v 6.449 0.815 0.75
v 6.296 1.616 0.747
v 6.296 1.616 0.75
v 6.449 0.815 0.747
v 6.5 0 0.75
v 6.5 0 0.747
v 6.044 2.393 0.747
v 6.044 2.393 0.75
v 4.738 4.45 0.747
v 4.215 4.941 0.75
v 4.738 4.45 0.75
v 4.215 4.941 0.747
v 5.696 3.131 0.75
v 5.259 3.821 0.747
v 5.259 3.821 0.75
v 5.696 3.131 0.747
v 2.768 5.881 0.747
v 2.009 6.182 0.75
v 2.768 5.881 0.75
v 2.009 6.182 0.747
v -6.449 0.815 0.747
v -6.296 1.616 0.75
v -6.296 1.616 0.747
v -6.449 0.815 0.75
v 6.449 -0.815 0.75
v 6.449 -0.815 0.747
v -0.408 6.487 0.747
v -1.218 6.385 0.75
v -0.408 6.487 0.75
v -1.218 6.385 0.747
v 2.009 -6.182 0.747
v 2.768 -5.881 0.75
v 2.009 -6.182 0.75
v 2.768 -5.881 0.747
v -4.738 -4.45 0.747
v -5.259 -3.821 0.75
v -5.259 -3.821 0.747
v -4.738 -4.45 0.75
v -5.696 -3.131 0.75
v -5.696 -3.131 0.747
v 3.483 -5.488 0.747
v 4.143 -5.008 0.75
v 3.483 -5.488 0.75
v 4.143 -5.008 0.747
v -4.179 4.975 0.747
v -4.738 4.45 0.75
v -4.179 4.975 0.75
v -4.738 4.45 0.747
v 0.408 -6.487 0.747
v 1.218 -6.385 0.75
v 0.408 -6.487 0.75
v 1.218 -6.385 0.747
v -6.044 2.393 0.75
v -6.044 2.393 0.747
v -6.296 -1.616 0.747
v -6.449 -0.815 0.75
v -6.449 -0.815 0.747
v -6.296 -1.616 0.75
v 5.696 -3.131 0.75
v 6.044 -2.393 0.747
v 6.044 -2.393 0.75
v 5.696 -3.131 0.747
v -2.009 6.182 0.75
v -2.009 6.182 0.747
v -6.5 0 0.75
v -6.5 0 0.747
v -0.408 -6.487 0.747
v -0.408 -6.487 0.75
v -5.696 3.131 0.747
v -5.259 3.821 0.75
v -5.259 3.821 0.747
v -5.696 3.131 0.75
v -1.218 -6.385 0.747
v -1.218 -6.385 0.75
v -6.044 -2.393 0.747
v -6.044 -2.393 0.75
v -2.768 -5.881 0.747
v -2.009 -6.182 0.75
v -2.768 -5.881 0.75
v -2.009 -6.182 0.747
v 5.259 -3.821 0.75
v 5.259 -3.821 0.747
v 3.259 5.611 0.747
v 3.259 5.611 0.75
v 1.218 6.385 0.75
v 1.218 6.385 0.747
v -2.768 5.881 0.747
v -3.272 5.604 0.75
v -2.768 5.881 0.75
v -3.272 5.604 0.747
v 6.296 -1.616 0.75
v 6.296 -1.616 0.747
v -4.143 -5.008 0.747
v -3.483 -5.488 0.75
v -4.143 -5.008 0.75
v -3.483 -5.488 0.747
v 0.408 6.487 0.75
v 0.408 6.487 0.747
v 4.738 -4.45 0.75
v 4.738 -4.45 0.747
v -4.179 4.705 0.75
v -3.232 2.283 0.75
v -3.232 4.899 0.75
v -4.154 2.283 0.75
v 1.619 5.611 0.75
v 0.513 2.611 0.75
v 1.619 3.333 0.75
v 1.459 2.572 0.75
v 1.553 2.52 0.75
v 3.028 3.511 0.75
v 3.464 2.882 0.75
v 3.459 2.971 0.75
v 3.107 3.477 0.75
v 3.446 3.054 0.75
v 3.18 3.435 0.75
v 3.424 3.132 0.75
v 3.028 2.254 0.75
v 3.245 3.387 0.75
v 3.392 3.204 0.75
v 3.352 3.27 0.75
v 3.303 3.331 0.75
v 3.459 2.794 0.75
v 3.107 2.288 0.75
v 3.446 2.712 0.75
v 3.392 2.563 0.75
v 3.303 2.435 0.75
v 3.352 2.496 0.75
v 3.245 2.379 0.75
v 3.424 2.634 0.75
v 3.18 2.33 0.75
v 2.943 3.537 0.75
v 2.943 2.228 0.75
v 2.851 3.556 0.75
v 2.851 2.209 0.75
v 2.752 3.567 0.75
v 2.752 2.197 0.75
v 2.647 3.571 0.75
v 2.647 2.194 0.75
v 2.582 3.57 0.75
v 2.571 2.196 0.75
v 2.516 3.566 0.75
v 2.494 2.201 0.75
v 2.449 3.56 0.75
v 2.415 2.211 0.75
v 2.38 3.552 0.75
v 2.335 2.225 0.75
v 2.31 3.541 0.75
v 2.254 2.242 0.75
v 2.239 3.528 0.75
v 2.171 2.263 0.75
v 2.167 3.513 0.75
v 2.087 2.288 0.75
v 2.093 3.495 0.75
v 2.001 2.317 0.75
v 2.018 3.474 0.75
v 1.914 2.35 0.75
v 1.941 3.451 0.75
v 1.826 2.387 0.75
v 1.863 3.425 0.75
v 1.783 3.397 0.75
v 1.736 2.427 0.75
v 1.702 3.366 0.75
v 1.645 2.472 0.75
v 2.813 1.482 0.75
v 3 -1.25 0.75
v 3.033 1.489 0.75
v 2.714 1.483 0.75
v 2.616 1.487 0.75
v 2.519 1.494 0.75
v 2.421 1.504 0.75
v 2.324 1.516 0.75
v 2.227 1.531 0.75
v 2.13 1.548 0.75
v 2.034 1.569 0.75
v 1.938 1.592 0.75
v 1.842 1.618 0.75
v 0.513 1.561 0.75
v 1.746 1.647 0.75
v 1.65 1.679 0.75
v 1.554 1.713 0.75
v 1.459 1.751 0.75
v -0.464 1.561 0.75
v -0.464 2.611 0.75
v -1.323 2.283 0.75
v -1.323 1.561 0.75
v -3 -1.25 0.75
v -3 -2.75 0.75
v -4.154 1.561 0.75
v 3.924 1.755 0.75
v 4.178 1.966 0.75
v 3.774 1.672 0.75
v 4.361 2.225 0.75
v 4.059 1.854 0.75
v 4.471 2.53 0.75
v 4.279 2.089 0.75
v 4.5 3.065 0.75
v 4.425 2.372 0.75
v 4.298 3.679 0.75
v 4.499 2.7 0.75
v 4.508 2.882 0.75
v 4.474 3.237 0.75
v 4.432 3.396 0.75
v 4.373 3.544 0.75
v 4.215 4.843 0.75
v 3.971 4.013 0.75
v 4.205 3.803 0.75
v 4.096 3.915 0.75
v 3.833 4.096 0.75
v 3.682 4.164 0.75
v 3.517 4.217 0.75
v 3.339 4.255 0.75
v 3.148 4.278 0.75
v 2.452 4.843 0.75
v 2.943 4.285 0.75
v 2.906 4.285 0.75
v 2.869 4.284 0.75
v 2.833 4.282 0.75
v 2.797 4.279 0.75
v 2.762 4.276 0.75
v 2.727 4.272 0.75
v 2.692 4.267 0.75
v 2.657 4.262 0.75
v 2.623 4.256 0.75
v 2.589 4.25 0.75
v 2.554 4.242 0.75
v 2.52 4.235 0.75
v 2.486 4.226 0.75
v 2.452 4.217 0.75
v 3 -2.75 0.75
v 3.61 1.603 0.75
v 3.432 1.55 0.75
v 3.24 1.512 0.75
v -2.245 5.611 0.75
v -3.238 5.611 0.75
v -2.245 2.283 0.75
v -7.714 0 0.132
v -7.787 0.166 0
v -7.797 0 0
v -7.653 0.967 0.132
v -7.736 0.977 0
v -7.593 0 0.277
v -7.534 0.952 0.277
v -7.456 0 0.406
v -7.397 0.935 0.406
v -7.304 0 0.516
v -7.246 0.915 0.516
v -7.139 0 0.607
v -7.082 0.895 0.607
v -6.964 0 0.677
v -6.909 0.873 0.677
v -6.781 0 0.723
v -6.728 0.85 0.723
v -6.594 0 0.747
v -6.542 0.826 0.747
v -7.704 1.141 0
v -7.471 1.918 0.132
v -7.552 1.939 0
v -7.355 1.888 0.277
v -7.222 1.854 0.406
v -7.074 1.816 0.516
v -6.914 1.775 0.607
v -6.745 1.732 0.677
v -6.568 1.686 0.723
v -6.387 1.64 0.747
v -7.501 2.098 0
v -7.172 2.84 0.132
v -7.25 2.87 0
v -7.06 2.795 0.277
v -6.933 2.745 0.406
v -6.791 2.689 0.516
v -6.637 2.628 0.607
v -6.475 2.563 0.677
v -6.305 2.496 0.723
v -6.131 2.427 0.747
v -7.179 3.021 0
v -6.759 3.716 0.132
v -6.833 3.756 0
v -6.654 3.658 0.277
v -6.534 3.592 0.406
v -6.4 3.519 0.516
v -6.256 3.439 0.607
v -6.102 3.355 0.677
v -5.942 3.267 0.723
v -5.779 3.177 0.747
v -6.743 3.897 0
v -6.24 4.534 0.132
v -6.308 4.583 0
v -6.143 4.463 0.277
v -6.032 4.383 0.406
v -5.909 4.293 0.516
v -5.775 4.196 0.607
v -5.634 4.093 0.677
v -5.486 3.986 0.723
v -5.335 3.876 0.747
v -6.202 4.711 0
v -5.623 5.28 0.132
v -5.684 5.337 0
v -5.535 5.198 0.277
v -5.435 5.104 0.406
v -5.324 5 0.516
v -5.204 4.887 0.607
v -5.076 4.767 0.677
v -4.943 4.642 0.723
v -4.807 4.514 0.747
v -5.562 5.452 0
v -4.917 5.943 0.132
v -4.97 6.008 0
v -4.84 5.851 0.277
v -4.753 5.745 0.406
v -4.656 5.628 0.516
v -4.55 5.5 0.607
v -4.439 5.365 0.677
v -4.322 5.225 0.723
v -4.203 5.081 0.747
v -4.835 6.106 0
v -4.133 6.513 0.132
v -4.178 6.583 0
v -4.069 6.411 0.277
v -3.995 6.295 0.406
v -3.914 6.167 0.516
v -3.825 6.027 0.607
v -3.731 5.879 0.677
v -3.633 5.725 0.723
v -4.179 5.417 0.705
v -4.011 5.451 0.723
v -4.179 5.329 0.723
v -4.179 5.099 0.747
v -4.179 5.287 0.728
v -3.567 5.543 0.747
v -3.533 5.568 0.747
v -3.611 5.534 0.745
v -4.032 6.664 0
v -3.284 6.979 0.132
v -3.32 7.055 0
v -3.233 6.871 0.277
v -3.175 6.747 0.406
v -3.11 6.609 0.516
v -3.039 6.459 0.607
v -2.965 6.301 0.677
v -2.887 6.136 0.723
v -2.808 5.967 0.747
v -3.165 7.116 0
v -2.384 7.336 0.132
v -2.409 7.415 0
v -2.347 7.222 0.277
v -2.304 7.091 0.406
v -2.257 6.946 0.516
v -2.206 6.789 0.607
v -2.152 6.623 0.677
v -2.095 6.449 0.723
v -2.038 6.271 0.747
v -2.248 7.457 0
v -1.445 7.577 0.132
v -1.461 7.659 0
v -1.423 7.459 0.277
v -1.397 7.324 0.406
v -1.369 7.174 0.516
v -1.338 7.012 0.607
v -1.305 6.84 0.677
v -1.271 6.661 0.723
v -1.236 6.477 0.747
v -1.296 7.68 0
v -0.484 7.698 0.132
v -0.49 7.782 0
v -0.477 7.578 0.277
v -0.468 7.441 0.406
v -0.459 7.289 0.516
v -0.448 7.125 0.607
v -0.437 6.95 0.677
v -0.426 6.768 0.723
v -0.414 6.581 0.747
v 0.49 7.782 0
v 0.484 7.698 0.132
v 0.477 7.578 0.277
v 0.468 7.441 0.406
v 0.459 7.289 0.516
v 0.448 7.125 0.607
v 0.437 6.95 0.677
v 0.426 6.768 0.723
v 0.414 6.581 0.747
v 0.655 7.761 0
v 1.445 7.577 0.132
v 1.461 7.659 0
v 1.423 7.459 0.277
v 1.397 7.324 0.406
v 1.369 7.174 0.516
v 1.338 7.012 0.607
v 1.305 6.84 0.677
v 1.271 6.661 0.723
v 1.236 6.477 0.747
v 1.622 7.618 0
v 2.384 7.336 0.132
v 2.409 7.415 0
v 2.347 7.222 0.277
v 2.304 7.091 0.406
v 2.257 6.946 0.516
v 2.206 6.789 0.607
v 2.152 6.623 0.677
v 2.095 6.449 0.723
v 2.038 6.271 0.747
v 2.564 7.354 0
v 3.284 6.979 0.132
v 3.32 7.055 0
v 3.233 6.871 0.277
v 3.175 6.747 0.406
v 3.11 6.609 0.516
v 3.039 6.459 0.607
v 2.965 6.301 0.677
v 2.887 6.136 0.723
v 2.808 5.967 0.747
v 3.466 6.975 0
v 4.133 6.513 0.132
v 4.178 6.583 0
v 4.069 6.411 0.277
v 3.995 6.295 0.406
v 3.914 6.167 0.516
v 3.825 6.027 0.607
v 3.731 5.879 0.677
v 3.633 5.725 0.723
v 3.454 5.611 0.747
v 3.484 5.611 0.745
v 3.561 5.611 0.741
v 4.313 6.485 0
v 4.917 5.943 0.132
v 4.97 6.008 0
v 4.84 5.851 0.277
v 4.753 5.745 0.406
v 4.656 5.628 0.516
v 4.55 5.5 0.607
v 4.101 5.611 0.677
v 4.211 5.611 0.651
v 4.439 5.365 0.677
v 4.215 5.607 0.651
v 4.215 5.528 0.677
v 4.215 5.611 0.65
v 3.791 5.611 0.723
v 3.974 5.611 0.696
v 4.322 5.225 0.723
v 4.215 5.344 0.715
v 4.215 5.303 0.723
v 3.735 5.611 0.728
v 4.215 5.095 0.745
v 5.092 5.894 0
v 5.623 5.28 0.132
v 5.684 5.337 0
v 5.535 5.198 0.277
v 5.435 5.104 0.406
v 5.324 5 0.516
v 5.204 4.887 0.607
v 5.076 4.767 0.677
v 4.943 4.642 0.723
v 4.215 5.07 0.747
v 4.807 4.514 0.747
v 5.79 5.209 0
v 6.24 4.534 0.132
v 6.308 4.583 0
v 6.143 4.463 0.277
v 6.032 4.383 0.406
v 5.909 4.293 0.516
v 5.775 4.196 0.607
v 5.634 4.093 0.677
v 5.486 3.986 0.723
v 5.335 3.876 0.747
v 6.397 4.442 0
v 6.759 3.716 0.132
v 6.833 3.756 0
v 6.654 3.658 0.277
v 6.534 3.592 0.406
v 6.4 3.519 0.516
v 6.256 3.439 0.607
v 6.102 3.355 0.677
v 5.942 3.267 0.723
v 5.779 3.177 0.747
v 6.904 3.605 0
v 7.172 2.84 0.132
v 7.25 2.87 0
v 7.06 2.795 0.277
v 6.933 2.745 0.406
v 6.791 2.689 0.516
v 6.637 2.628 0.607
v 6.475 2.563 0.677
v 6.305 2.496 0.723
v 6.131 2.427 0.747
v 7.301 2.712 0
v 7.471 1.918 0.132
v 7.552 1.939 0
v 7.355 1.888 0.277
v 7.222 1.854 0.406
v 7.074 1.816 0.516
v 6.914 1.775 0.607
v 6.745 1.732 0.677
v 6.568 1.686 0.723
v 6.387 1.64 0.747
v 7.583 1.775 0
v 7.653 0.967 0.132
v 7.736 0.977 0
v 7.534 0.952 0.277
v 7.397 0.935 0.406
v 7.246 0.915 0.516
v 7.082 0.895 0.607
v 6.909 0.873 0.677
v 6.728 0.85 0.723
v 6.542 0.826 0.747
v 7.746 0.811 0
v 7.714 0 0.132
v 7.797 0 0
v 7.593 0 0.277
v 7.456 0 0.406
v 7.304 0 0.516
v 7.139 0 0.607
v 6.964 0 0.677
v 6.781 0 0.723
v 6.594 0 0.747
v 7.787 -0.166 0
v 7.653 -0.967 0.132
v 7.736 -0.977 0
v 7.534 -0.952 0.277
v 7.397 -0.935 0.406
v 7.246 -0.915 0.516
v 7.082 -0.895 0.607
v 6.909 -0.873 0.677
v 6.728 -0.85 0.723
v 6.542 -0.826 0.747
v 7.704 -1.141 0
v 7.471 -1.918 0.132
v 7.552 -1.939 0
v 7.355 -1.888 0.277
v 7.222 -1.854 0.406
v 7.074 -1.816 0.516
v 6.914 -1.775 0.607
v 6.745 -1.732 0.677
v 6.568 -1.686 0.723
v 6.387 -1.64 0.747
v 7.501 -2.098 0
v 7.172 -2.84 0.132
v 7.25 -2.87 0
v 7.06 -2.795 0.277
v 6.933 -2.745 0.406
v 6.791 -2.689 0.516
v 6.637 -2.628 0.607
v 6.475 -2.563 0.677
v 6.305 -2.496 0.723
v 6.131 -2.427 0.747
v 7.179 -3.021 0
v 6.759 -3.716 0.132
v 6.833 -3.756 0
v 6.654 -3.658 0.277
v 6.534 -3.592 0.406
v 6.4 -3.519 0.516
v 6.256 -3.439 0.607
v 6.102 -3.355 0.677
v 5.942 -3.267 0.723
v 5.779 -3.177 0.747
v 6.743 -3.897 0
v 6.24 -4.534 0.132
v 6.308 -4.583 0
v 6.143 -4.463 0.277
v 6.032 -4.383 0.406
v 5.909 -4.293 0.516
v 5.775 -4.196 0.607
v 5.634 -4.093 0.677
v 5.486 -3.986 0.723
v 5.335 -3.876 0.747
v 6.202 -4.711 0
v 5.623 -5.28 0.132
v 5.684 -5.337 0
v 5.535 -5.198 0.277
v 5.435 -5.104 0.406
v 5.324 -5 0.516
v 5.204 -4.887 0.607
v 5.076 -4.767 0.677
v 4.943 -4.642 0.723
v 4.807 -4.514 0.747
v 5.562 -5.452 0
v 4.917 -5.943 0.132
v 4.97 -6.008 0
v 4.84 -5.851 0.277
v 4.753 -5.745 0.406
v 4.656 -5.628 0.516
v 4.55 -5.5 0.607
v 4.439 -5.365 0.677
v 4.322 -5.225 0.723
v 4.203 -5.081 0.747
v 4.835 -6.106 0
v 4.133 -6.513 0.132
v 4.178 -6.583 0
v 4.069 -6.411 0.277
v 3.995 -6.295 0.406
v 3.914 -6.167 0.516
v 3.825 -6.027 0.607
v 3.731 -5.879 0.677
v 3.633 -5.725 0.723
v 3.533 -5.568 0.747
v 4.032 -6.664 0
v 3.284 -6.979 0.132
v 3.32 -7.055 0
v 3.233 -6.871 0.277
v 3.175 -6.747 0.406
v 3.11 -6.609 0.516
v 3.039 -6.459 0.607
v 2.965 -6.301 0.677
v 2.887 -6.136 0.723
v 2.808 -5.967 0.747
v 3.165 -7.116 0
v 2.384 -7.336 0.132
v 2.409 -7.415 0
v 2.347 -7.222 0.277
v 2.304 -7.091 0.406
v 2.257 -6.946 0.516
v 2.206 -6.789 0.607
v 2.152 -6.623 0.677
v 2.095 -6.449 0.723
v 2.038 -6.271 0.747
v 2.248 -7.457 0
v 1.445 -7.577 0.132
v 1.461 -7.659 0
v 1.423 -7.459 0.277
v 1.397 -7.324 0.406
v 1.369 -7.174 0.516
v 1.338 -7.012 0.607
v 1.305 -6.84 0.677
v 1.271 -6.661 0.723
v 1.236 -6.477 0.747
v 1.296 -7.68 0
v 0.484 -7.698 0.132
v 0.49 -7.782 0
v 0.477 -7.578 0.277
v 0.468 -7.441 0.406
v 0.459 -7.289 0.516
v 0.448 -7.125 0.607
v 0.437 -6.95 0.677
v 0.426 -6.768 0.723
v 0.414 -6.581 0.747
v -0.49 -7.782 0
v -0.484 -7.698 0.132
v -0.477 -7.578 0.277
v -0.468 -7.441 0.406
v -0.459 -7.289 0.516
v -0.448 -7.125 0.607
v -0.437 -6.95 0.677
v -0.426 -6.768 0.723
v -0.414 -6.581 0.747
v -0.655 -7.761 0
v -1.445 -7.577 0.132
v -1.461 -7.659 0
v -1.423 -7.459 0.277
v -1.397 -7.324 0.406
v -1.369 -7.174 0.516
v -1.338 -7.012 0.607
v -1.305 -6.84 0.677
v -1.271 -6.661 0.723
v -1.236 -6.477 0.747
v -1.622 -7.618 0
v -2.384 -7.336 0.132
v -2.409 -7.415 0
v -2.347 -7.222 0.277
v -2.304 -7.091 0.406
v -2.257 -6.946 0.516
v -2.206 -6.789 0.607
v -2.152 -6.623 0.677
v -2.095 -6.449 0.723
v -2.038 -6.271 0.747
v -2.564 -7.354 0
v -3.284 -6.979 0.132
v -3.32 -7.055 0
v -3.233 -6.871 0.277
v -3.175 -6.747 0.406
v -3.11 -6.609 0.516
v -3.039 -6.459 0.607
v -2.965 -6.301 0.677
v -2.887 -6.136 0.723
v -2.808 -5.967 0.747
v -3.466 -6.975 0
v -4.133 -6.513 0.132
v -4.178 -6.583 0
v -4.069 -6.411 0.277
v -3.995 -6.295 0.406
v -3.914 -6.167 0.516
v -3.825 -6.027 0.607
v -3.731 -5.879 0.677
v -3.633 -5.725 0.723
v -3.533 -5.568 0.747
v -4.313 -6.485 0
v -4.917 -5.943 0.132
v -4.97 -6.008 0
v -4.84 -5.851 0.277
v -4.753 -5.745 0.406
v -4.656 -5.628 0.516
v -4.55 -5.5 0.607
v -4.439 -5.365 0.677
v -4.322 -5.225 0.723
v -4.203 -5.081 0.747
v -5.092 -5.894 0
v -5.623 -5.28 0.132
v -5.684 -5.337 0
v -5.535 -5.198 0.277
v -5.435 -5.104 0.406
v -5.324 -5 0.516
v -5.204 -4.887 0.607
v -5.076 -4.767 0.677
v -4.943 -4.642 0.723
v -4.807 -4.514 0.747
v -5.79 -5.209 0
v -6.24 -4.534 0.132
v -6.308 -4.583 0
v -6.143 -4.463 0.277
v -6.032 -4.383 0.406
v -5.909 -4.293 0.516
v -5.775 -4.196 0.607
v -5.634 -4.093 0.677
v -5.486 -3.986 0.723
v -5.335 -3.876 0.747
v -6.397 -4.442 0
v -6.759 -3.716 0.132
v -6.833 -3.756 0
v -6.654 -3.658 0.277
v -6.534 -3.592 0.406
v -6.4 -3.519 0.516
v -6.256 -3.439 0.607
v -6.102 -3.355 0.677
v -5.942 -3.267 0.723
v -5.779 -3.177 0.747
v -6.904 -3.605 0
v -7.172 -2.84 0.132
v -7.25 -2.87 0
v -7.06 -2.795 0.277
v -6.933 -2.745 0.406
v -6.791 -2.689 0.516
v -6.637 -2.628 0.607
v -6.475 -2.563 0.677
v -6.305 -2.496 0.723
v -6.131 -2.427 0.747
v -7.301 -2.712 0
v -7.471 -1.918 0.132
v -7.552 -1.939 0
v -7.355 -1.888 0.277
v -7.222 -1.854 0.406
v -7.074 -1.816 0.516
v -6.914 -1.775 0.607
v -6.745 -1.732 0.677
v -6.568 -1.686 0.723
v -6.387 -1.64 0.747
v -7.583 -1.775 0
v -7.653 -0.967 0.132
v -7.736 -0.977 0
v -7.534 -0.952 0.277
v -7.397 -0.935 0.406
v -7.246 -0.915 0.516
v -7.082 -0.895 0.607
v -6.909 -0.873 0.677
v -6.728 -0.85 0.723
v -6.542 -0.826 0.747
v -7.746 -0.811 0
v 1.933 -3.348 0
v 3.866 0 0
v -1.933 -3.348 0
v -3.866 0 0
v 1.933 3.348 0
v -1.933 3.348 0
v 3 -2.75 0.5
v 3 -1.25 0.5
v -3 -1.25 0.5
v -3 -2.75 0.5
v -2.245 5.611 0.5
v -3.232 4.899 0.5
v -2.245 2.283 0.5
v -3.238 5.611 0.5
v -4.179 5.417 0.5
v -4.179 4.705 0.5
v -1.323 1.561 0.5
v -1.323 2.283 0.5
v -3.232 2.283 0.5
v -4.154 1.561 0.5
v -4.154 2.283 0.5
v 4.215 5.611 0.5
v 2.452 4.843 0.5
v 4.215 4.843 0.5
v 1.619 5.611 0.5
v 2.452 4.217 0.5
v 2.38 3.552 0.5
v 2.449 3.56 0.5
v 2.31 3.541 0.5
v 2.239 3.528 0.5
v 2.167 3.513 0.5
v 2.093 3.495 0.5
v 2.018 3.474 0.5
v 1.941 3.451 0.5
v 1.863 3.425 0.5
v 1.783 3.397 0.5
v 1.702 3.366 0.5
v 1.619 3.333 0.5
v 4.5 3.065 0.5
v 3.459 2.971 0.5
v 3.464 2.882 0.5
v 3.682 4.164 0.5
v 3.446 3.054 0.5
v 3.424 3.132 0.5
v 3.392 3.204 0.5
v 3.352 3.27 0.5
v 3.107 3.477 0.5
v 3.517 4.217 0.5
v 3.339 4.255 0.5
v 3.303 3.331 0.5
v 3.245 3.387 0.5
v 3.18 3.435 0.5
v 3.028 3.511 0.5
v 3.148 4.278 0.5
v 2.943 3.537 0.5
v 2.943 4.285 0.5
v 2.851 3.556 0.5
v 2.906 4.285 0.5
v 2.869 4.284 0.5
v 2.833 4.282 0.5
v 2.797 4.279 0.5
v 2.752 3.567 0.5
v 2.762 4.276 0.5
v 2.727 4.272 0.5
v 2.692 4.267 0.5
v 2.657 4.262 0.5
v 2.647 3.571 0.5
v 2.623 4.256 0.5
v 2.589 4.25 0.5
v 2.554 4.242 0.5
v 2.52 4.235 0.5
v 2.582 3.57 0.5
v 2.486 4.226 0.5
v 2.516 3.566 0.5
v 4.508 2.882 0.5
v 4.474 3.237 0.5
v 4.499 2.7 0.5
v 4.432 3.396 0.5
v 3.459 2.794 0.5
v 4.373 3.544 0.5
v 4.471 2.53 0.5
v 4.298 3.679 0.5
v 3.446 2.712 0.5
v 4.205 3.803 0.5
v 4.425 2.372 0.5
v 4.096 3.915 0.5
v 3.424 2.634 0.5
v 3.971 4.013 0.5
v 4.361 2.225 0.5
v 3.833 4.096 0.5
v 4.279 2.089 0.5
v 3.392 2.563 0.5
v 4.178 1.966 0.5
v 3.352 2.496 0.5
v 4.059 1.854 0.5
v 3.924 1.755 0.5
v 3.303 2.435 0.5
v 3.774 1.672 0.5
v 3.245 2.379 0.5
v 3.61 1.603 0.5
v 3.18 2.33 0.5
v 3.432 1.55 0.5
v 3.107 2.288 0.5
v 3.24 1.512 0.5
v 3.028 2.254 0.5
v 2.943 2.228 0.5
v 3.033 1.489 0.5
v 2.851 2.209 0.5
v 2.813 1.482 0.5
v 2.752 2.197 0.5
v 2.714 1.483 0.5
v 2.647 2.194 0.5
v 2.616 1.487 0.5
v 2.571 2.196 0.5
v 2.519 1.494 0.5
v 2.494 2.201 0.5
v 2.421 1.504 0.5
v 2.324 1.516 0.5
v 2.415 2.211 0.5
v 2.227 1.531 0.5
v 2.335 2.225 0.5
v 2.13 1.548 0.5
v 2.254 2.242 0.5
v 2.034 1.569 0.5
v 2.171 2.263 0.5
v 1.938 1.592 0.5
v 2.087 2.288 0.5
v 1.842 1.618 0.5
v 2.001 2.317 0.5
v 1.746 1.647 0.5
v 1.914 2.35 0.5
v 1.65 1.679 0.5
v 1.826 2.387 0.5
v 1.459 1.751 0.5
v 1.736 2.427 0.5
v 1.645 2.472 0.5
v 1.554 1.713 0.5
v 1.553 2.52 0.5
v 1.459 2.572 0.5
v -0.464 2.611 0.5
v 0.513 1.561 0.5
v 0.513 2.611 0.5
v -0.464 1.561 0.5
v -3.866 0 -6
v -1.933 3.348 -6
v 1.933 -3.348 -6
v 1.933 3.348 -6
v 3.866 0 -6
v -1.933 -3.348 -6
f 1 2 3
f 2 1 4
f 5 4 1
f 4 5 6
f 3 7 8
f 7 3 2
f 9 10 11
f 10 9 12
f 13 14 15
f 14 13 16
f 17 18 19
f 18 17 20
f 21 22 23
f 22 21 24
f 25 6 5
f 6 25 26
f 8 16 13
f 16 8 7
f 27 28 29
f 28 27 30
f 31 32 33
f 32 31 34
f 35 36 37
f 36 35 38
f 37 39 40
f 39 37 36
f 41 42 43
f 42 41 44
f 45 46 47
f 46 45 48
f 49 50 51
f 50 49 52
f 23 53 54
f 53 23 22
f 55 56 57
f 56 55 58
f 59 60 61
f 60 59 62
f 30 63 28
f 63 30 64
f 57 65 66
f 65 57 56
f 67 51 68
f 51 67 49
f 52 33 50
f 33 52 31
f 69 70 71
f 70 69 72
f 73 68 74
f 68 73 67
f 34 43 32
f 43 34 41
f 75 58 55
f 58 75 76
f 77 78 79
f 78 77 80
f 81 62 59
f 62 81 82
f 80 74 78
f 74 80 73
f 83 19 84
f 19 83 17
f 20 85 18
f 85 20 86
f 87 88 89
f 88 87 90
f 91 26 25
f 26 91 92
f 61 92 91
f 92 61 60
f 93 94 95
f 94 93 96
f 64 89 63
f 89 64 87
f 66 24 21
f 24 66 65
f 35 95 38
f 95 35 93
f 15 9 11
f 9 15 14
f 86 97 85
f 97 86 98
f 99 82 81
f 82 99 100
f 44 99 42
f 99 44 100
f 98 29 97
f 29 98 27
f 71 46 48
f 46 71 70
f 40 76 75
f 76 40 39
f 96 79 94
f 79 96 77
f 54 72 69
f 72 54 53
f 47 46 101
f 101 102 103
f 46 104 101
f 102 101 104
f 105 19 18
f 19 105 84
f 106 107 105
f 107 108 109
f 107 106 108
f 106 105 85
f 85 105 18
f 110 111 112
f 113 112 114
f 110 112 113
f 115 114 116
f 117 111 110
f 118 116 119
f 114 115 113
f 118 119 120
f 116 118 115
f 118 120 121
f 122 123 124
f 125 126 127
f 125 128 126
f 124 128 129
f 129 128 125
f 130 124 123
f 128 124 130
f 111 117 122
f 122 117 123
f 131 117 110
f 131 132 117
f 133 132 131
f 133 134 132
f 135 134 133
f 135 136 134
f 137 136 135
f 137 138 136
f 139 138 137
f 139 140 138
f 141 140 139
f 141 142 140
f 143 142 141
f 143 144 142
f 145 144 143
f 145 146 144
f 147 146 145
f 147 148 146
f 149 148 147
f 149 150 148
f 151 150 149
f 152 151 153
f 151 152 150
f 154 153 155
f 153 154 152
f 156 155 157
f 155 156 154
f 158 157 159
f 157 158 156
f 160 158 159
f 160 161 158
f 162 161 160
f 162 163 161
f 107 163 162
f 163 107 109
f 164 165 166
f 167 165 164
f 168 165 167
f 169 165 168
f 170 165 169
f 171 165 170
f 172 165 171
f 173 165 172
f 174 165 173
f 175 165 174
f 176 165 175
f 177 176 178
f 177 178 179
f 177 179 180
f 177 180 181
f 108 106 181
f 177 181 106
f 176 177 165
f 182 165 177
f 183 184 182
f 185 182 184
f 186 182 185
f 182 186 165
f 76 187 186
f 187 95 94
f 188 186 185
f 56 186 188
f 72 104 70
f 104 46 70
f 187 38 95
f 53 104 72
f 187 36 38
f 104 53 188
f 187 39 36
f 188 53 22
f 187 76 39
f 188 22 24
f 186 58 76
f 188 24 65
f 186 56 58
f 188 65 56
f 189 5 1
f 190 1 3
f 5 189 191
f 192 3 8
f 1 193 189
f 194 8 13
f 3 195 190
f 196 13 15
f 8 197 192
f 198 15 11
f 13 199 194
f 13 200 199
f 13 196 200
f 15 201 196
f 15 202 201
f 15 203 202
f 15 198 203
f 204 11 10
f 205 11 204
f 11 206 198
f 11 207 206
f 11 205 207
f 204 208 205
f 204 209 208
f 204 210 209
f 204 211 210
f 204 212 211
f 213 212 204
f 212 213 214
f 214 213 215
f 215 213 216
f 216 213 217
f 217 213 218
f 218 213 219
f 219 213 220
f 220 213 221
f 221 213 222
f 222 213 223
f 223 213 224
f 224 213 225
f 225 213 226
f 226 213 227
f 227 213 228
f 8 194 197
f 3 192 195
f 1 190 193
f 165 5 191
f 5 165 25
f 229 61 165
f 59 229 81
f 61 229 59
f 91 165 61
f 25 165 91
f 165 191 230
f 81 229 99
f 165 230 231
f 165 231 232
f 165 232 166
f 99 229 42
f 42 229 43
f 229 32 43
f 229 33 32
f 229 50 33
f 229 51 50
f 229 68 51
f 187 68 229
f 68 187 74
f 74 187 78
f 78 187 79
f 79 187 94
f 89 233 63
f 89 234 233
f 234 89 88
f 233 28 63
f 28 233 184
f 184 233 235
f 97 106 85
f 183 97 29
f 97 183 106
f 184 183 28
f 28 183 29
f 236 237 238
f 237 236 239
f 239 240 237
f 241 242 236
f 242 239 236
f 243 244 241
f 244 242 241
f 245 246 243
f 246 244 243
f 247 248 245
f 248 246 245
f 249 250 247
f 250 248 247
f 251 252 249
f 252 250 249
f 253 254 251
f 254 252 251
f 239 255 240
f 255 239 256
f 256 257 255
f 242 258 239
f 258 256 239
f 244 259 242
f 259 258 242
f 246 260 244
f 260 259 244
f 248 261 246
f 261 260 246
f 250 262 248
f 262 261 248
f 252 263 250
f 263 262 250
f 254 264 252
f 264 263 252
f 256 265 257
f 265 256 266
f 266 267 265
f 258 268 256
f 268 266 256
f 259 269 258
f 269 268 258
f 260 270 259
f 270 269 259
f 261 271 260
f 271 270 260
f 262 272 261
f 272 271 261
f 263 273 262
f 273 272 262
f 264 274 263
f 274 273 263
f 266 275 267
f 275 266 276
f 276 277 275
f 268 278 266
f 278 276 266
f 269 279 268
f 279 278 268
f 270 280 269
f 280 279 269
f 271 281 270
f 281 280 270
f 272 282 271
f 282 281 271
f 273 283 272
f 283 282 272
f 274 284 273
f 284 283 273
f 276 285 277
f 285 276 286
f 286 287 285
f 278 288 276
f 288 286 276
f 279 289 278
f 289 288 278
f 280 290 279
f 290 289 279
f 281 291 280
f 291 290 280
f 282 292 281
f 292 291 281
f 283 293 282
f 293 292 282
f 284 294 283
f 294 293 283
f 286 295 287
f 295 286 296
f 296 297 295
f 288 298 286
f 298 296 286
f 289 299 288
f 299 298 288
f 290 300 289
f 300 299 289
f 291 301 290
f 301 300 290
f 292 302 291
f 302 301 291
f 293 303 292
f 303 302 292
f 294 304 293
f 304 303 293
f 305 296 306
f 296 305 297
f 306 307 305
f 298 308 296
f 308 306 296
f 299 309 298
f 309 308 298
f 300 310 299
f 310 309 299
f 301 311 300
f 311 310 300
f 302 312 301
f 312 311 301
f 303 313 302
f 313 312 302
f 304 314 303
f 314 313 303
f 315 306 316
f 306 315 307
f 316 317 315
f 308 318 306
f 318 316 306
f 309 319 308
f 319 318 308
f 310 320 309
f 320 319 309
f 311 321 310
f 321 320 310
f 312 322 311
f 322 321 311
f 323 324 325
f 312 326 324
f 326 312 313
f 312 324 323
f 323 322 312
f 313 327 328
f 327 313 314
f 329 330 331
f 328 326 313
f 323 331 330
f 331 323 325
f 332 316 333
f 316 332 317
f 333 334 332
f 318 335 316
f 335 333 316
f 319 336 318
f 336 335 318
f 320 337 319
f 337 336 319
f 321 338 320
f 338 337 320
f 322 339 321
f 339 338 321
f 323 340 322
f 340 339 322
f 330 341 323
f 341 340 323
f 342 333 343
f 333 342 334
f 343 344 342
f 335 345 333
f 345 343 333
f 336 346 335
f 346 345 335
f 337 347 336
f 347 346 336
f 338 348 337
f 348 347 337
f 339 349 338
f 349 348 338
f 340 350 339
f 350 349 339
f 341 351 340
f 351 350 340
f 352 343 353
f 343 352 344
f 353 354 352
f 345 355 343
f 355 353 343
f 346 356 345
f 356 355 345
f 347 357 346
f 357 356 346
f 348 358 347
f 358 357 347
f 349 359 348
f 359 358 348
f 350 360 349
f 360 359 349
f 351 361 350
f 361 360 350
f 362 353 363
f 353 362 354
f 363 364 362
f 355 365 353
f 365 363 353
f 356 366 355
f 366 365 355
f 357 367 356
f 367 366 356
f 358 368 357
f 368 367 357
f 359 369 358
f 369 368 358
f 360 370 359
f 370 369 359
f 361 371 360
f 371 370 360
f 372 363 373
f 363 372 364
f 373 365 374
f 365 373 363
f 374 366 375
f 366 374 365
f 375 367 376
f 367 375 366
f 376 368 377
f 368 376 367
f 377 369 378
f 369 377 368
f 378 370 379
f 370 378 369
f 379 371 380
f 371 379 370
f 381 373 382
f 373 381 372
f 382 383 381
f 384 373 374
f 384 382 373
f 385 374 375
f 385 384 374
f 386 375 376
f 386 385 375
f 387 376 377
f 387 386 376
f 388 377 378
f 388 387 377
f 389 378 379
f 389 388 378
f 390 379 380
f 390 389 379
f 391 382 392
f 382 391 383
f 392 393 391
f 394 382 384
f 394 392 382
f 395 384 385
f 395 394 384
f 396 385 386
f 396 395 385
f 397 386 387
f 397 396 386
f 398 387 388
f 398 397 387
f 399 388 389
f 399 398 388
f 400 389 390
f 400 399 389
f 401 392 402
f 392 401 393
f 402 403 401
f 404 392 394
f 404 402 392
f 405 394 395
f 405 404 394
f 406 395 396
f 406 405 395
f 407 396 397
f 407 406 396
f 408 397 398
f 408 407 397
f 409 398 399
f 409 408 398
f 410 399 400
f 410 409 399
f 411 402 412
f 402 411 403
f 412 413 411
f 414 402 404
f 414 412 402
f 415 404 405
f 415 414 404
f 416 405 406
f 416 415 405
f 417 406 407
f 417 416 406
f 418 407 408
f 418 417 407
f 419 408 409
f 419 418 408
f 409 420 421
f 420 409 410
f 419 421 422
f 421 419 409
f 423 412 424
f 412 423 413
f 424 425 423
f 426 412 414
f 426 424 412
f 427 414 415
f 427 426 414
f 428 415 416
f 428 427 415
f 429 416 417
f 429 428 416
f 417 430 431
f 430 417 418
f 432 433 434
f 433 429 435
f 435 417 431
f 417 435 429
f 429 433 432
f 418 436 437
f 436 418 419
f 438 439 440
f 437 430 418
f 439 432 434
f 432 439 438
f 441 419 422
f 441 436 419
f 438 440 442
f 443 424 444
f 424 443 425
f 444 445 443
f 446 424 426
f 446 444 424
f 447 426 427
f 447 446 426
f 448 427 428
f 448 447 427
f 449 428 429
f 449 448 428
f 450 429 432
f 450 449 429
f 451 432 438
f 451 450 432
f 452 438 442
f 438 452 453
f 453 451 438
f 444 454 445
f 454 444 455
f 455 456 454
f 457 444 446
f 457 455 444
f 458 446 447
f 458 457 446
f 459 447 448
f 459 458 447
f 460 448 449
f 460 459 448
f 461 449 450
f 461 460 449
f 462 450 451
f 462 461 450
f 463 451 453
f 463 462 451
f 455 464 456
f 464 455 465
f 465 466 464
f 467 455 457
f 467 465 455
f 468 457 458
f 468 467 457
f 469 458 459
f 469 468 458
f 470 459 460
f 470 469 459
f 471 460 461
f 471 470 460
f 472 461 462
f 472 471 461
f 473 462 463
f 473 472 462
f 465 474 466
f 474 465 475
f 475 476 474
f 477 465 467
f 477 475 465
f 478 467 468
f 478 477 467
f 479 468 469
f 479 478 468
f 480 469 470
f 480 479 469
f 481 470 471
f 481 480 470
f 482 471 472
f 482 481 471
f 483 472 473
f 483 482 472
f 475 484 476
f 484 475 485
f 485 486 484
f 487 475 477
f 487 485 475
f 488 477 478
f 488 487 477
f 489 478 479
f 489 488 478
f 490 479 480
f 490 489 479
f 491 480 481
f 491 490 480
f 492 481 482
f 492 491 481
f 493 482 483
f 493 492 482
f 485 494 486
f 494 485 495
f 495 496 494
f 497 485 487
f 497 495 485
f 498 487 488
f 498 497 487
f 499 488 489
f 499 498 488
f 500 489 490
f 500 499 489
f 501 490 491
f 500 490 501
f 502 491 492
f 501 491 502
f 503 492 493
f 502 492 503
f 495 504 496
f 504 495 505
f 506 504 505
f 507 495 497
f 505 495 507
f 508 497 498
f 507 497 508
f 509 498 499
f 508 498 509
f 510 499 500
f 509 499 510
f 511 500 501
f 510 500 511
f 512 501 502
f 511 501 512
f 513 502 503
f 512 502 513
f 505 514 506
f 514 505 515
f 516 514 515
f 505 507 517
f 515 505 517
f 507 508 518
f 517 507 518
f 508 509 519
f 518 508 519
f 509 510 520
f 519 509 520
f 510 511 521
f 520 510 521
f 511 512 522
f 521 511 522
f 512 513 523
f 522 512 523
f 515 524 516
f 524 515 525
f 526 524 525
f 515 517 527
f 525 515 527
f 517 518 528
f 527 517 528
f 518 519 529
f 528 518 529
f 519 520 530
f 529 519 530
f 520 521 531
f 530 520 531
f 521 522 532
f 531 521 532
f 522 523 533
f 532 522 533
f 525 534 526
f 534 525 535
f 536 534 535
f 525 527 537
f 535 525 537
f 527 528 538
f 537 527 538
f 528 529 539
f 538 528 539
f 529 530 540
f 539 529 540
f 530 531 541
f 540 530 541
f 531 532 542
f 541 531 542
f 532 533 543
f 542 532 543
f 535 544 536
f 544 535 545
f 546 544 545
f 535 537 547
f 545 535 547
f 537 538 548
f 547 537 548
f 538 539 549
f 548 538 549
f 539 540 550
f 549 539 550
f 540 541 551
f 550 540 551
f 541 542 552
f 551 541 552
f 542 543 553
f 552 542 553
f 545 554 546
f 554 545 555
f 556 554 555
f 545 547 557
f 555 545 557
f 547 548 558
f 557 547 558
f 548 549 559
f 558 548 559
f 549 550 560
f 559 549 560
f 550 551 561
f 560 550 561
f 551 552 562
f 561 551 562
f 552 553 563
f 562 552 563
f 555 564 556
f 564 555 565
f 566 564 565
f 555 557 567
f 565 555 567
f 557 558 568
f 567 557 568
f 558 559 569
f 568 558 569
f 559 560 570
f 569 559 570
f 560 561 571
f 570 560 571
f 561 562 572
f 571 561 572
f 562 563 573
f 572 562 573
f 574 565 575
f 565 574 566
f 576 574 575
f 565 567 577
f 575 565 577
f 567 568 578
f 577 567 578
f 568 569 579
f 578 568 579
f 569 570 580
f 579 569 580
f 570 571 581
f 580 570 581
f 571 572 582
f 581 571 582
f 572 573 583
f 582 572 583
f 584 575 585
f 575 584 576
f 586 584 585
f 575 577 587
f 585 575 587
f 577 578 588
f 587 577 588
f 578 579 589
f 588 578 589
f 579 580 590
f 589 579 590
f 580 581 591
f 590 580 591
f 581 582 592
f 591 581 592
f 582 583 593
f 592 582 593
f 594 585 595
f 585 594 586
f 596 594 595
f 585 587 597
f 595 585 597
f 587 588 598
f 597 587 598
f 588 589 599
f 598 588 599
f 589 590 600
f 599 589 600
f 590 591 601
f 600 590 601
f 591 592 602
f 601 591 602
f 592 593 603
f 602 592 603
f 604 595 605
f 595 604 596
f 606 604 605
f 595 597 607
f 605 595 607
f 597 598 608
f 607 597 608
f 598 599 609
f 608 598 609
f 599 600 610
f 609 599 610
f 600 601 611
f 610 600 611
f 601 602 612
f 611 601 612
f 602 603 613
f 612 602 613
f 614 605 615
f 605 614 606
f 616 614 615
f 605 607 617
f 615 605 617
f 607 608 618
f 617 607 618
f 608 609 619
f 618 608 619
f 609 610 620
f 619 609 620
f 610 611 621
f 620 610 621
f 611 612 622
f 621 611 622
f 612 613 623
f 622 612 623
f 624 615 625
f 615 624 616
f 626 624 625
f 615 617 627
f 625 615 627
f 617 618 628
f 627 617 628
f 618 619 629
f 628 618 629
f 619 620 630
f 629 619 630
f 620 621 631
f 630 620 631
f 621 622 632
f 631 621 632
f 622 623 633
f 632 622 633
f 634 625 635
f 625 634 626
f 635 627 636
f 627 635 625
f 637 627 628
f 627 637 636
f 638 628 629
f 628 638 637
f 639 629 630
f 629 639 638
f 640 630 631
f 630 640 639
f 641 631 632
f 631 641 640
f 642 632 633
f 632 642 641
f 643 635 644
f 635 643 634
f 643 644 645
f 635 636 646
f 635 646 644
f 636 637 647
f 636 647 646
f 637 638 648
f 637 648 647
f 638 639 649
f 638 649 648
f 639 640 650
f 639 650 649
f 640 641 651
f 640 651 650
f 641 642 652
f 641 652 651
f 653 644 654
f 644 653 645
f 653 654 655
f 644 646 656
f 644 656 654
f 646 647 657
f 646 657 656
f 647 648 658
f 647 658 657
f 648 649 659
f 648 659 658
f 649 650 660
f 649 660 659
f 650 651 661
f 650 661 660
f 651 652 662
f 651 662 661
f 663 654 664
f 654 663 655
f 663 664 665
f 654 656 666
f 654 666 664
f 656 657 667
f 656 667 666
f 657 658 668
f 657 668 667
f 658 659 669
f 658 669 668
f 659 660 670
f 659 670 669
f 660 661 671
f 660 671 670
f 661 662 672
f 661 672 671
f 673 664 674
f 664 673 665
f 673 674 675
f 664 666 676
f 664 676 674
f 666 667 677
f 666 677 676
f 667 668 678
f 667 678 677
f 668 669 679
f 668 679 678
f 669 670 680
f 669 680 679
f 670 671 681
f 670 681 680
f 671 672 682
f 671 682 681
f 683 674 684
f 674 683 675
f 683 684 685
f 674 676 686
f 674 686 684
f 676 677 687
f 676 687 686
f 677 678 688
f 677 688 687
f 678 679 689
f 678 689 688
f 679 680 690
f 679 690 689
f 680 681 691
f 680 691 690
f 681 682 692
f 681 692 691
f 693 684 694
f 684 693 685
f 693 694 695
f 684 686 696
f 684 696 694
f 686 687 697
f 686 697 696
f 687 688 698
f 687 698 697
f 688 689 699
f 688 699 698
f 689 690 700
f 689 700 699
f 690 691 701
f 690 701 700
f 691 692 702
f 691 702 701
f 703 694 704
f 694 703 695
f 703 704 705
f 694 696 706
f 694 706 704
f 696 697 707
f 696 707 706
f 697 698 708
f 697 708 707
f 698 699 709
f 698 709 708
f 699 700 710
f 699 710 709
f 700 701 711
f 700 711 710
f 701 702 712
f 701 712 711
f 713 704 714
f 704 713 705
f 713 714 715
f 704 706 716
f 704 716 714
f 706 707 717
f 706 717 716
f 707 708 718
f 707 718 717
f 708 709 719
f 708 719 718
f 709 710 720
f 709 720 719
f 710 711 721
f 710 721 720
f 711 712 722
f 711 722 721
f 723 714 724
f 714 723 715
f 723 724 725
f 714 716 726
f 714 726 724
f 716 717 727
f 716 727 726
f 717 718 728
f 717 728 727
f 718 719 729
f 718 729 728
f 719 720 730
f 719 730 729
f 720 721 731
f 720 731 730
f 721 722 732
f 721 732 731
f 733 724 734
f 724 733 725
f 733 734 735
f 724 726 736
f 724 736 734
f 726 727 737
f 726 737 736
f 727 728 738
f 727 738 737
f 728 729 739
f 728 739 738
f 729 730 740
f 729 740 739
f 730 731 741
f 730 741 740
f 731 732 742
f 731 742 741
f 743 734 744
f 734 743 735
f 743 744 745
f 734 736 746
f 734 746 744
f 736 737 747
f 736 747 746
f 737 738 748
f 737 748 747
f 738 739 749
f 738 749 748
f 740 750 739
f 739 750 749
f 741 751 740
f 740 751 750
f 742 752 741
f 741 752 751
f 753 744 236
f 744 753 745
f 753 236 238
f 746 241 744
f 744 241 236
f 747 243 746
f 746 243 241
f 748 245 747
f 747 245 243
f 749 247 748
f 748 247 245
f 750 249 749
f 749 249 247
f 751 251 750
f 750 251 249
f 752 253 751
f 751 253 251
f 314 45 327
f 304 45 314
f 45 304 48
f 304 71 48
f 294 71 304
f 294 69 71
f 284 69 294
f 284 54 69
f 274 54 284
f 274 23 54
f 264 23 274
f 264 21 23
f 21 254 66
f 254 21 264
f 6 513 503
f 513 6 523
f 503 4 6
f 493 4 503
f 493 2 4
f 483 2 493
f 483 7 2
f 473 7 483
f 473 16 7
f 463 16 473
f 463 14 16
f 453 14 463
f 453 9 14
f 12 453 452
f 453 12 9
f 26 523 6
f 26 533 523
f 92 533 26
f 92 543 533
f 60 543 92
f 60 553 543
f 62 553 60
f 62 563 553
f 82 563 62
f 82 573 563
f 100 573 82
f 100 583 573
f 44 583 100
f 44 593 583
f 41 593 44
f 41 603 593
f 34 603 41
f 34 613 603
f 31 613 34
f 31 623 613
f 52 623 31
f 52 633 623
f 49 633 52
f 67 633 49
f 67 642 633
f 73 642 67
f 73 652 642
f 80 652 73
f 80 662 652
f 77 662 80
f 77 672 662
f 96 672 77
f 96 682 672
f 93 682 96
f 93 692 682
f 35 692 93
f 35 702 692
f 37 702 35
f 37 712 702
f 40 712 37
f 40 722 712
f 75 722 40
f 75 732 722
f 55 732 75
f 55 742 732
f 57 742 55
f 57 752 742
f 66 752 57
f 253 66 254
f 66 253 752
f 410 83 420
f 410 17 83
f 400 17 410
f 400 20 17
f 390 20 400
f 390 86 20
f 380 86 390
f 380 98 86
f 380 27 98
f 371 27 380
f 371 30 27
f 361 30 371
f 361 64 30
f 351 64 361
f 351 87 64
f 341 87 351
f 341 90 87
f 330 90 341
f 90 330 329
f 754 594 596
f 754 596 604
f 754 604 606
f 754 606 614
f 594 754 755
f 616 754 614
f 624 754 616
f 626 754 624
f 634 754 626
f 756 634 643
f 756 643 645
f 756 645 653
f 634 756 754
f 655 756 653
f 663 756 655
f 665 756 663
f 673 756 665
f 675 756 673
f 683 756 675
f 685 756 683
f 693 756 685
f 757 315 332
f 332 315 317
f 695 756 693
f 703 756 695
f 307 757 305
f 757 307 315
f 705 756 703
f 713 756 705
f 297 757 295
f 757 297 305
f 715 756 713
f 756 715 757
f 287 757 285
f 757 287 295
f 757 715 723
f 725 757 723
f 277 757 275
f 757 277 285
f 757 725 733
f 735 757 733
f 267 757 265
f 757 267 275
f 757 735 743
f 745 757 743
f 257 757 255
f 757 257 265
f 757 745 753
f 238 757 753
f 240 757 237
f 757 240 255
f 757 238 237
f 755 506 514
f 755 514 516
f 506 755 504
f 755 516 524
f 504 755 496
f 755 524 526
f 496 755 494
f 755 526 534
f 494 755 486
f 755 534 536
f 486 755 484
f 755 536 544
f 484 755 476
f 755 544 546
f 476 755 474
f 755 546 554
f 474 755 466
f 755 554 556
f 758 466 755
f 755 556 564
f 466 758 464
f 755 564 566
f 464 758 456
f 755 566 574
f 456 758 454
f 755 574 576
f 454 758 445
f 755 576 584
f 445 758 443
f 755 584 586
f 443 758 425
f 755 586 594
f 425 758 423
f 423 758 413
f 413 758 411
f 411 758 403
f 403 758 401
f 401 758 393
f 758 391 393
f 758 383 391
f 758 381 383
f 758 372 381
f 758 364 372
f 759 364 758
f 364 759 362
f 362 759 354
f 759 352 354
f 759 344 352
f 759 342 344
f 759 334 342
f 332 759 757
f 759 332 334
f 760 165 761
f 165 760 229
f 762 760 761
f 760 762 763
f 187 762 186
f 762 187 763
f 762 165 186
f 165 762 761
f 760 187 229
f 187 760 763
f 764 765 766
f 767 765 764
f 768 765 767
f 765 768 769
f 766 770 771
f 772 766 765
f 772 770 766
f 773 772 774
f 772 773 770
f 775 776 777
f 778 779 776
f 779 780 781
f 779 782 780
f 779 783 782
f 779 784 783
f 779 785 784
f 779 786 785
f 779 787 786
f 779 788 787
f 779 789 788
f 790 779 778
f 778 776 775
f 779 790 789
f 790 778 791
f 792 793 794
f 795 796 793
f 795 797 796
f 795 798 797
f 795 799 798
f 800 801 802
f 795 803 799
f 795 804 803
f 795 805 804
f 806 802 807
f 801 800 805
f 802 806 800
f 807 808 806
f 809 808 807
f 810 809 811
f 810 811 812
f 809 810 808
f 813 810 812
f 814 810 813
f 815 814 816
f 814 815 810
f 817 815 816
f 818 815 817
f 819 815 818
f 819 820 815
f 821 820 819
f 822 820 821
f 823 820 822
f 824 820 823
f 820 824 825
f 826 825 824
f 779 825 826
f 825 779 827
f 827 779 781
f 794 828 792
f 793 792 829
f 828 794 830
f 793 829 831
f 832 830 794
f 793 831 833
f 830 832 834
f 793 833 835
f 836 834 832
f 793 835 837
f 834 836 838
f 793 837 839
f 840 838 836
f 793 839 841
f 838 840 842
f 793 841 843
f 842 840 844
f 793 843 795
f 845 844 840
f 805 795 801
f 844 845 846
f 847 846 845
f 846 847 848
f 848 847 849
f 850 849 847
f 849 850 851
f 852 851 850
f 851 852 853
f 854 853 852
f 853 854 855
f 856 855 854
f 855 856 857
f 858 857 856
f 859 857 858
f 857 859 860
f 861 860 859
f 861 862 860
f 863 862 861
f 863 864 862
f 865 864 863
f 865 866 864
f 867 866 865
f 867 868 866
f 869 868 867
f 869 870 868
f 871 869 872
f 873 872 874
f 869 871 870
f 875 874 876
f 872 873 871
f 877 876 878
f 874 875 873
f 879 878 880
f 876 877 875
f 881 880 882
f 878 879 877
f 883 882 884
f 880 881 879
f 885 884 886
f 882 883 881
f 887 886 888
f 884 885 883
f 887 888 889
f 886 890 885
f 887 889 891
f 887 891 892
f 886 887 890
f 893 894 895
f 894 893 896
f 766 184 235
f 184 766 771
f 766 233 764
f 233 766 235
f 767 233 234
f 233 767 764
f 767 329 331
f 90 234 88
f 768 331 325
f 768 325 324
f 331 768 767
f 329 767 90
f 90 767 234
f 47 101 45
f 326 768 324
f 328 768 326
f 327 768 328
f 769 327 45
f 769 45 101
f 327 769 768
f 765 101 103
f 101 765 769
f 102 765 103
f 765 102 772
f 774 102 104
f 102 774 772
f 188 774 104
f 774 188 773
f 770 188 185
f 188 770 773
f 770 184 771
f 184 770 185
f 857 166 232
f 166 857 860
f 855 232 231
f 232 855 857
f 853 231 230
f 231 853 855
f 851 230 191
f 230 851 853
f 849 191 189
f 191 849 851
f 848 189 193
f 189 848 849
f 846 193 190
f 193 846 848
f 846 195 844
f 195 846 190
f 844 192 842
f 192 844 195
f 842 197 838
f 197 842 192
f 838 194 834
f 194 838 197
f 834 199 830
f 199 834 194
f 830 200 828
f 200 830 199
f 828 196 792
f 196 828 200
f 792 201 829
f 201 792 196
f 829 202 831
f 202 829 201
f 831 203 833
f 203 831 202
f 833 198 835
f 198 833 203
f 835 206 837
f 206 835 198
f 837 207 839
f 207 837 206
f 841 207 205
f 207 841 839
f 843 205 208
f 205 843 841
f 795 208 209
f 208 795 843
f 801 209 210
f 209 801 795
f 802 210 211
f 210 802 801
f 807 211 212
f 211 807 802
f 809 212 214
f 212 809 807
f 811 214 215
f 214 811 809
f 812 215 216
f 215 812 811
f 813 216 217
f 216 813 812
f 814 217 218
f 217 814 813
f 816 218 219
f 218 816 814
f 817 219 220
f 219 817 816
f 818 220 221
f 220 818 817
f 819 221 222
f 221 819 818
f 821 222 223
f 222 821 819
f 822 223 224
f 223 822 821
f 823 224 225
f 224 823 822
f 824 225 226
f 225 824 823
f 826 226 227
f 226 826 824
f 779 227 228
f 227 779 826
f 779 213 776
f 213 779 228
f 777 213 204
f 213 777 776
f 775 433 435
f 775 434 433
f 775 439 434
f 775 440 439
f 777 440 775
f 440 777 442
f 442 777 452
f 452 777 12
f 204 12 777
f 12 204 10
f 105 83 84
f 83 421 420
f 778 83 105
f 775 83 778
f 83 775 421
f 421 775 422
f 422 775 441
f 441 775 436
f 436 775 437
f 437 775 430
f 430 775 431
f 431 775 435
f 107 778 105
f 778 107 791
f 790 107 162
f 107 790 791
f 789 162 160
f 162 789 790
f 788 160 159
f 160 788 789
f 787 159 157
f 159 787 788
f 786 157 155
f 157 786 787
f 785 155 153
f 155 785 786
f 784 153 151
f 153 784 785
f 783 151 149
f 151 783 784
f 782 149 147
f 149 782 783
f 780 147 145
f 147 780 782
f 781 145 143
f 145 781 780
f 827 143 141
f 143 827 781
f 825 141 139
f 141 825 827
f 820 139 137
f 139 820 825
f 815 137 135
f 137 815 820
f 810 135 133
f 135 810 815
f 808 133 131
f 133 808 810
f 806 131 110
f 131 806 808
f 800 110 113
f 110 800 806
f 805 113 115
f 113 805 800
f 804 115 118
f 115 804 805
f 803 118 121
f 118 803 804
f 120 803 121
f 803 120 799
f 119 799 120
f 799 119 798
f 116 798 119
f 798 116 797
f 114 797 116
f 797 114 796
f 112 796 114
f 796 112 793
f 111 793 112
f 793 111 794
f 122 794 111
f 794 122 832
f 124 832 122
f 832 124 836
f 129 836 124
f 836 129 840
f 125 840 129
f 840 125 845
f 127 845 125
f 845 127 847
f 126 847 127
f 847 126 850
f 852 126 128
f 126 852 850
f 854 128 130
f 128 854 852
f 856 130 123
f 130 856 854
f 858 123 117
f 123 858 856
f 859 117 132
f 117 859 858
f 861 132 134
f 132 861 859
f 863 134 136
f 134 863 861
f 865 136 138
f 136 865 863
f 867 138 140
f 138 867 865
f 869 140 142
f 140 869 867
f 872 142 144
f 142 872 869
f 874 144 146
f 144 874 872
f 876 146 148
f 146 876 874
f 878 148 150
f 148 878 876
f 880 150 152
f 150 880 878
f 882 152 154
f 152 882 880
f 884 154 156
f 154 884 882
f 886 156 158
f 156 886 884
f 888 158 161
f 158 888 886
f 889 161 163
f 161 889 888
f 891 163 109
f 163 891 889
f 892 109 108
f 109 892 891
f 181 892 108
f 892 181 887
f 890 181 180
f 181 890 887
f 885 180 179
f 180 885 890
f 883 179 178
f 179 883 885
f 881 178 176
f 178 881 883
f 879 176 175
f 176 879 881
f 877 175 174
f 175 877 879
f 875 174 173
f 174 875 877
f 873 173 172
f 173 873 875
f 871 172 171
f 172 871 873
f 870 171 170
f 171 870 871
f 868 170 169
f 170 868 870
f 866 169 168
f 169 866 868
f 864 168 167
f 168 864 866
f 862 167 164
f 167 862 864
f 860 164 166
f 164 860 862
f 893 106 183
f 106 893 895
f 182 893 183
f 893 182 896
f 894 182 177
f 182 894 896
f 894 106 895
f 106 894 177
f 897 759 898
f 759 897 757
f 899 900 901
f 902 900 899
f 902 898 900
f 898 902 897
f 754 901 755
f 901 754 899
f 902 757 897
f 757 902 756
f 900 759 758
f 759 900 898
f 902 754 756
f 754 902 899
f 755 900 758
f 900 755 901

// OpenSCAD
$fn = 50;


union() {
	difference() {
		union() {
			translate(v = [0, 0, -0.7500000000]) {
				cylinder(h = 1.5000000000, r = 6.5000000000);
			}
			translate(v = [0, 0, -0.7500000000]) {
				rotate_extrude(angle = 360) {
					translate(v = [6.5000000000, 0, 0]) {
						circle(r = 1.5000000000);
					}
				}
			}
		}
		union() {
			translate(v = [-25.0000000000, -25.0000000000, -50]) {
				cube(size = [50, 50, 50]);
			}
			#translate(v = [-3.0000000000, -2.7500000000, 0.5000000000]) {
				cube(size = [6, 1.5000000000, 0.2500000000]);
			}
			#translate(v = [0, 3.5000000000, 0.5000000000]) {
				linear_extrude(height = 0.2500000000) {
					text(font = "SegoiUI:Bold", halign = "center", size = 4, text = "1.5", valign = "center");
				}
			}
		}
	}
	union() {
		translate(v = [0, 0, -6]) {
			linear_extrude(height = 6) {
				polygon(points = [[3.8658550000, 0.0000000000], [1.9329275000, 3.3479286373], [-1.9329275000, 3.3479286373], [-3.8658550000, 0.0000000000], [-1.9329275000, -3.3479286373], [1.9329275000, -3.3479286373]]);
			}
		}
	}
}
